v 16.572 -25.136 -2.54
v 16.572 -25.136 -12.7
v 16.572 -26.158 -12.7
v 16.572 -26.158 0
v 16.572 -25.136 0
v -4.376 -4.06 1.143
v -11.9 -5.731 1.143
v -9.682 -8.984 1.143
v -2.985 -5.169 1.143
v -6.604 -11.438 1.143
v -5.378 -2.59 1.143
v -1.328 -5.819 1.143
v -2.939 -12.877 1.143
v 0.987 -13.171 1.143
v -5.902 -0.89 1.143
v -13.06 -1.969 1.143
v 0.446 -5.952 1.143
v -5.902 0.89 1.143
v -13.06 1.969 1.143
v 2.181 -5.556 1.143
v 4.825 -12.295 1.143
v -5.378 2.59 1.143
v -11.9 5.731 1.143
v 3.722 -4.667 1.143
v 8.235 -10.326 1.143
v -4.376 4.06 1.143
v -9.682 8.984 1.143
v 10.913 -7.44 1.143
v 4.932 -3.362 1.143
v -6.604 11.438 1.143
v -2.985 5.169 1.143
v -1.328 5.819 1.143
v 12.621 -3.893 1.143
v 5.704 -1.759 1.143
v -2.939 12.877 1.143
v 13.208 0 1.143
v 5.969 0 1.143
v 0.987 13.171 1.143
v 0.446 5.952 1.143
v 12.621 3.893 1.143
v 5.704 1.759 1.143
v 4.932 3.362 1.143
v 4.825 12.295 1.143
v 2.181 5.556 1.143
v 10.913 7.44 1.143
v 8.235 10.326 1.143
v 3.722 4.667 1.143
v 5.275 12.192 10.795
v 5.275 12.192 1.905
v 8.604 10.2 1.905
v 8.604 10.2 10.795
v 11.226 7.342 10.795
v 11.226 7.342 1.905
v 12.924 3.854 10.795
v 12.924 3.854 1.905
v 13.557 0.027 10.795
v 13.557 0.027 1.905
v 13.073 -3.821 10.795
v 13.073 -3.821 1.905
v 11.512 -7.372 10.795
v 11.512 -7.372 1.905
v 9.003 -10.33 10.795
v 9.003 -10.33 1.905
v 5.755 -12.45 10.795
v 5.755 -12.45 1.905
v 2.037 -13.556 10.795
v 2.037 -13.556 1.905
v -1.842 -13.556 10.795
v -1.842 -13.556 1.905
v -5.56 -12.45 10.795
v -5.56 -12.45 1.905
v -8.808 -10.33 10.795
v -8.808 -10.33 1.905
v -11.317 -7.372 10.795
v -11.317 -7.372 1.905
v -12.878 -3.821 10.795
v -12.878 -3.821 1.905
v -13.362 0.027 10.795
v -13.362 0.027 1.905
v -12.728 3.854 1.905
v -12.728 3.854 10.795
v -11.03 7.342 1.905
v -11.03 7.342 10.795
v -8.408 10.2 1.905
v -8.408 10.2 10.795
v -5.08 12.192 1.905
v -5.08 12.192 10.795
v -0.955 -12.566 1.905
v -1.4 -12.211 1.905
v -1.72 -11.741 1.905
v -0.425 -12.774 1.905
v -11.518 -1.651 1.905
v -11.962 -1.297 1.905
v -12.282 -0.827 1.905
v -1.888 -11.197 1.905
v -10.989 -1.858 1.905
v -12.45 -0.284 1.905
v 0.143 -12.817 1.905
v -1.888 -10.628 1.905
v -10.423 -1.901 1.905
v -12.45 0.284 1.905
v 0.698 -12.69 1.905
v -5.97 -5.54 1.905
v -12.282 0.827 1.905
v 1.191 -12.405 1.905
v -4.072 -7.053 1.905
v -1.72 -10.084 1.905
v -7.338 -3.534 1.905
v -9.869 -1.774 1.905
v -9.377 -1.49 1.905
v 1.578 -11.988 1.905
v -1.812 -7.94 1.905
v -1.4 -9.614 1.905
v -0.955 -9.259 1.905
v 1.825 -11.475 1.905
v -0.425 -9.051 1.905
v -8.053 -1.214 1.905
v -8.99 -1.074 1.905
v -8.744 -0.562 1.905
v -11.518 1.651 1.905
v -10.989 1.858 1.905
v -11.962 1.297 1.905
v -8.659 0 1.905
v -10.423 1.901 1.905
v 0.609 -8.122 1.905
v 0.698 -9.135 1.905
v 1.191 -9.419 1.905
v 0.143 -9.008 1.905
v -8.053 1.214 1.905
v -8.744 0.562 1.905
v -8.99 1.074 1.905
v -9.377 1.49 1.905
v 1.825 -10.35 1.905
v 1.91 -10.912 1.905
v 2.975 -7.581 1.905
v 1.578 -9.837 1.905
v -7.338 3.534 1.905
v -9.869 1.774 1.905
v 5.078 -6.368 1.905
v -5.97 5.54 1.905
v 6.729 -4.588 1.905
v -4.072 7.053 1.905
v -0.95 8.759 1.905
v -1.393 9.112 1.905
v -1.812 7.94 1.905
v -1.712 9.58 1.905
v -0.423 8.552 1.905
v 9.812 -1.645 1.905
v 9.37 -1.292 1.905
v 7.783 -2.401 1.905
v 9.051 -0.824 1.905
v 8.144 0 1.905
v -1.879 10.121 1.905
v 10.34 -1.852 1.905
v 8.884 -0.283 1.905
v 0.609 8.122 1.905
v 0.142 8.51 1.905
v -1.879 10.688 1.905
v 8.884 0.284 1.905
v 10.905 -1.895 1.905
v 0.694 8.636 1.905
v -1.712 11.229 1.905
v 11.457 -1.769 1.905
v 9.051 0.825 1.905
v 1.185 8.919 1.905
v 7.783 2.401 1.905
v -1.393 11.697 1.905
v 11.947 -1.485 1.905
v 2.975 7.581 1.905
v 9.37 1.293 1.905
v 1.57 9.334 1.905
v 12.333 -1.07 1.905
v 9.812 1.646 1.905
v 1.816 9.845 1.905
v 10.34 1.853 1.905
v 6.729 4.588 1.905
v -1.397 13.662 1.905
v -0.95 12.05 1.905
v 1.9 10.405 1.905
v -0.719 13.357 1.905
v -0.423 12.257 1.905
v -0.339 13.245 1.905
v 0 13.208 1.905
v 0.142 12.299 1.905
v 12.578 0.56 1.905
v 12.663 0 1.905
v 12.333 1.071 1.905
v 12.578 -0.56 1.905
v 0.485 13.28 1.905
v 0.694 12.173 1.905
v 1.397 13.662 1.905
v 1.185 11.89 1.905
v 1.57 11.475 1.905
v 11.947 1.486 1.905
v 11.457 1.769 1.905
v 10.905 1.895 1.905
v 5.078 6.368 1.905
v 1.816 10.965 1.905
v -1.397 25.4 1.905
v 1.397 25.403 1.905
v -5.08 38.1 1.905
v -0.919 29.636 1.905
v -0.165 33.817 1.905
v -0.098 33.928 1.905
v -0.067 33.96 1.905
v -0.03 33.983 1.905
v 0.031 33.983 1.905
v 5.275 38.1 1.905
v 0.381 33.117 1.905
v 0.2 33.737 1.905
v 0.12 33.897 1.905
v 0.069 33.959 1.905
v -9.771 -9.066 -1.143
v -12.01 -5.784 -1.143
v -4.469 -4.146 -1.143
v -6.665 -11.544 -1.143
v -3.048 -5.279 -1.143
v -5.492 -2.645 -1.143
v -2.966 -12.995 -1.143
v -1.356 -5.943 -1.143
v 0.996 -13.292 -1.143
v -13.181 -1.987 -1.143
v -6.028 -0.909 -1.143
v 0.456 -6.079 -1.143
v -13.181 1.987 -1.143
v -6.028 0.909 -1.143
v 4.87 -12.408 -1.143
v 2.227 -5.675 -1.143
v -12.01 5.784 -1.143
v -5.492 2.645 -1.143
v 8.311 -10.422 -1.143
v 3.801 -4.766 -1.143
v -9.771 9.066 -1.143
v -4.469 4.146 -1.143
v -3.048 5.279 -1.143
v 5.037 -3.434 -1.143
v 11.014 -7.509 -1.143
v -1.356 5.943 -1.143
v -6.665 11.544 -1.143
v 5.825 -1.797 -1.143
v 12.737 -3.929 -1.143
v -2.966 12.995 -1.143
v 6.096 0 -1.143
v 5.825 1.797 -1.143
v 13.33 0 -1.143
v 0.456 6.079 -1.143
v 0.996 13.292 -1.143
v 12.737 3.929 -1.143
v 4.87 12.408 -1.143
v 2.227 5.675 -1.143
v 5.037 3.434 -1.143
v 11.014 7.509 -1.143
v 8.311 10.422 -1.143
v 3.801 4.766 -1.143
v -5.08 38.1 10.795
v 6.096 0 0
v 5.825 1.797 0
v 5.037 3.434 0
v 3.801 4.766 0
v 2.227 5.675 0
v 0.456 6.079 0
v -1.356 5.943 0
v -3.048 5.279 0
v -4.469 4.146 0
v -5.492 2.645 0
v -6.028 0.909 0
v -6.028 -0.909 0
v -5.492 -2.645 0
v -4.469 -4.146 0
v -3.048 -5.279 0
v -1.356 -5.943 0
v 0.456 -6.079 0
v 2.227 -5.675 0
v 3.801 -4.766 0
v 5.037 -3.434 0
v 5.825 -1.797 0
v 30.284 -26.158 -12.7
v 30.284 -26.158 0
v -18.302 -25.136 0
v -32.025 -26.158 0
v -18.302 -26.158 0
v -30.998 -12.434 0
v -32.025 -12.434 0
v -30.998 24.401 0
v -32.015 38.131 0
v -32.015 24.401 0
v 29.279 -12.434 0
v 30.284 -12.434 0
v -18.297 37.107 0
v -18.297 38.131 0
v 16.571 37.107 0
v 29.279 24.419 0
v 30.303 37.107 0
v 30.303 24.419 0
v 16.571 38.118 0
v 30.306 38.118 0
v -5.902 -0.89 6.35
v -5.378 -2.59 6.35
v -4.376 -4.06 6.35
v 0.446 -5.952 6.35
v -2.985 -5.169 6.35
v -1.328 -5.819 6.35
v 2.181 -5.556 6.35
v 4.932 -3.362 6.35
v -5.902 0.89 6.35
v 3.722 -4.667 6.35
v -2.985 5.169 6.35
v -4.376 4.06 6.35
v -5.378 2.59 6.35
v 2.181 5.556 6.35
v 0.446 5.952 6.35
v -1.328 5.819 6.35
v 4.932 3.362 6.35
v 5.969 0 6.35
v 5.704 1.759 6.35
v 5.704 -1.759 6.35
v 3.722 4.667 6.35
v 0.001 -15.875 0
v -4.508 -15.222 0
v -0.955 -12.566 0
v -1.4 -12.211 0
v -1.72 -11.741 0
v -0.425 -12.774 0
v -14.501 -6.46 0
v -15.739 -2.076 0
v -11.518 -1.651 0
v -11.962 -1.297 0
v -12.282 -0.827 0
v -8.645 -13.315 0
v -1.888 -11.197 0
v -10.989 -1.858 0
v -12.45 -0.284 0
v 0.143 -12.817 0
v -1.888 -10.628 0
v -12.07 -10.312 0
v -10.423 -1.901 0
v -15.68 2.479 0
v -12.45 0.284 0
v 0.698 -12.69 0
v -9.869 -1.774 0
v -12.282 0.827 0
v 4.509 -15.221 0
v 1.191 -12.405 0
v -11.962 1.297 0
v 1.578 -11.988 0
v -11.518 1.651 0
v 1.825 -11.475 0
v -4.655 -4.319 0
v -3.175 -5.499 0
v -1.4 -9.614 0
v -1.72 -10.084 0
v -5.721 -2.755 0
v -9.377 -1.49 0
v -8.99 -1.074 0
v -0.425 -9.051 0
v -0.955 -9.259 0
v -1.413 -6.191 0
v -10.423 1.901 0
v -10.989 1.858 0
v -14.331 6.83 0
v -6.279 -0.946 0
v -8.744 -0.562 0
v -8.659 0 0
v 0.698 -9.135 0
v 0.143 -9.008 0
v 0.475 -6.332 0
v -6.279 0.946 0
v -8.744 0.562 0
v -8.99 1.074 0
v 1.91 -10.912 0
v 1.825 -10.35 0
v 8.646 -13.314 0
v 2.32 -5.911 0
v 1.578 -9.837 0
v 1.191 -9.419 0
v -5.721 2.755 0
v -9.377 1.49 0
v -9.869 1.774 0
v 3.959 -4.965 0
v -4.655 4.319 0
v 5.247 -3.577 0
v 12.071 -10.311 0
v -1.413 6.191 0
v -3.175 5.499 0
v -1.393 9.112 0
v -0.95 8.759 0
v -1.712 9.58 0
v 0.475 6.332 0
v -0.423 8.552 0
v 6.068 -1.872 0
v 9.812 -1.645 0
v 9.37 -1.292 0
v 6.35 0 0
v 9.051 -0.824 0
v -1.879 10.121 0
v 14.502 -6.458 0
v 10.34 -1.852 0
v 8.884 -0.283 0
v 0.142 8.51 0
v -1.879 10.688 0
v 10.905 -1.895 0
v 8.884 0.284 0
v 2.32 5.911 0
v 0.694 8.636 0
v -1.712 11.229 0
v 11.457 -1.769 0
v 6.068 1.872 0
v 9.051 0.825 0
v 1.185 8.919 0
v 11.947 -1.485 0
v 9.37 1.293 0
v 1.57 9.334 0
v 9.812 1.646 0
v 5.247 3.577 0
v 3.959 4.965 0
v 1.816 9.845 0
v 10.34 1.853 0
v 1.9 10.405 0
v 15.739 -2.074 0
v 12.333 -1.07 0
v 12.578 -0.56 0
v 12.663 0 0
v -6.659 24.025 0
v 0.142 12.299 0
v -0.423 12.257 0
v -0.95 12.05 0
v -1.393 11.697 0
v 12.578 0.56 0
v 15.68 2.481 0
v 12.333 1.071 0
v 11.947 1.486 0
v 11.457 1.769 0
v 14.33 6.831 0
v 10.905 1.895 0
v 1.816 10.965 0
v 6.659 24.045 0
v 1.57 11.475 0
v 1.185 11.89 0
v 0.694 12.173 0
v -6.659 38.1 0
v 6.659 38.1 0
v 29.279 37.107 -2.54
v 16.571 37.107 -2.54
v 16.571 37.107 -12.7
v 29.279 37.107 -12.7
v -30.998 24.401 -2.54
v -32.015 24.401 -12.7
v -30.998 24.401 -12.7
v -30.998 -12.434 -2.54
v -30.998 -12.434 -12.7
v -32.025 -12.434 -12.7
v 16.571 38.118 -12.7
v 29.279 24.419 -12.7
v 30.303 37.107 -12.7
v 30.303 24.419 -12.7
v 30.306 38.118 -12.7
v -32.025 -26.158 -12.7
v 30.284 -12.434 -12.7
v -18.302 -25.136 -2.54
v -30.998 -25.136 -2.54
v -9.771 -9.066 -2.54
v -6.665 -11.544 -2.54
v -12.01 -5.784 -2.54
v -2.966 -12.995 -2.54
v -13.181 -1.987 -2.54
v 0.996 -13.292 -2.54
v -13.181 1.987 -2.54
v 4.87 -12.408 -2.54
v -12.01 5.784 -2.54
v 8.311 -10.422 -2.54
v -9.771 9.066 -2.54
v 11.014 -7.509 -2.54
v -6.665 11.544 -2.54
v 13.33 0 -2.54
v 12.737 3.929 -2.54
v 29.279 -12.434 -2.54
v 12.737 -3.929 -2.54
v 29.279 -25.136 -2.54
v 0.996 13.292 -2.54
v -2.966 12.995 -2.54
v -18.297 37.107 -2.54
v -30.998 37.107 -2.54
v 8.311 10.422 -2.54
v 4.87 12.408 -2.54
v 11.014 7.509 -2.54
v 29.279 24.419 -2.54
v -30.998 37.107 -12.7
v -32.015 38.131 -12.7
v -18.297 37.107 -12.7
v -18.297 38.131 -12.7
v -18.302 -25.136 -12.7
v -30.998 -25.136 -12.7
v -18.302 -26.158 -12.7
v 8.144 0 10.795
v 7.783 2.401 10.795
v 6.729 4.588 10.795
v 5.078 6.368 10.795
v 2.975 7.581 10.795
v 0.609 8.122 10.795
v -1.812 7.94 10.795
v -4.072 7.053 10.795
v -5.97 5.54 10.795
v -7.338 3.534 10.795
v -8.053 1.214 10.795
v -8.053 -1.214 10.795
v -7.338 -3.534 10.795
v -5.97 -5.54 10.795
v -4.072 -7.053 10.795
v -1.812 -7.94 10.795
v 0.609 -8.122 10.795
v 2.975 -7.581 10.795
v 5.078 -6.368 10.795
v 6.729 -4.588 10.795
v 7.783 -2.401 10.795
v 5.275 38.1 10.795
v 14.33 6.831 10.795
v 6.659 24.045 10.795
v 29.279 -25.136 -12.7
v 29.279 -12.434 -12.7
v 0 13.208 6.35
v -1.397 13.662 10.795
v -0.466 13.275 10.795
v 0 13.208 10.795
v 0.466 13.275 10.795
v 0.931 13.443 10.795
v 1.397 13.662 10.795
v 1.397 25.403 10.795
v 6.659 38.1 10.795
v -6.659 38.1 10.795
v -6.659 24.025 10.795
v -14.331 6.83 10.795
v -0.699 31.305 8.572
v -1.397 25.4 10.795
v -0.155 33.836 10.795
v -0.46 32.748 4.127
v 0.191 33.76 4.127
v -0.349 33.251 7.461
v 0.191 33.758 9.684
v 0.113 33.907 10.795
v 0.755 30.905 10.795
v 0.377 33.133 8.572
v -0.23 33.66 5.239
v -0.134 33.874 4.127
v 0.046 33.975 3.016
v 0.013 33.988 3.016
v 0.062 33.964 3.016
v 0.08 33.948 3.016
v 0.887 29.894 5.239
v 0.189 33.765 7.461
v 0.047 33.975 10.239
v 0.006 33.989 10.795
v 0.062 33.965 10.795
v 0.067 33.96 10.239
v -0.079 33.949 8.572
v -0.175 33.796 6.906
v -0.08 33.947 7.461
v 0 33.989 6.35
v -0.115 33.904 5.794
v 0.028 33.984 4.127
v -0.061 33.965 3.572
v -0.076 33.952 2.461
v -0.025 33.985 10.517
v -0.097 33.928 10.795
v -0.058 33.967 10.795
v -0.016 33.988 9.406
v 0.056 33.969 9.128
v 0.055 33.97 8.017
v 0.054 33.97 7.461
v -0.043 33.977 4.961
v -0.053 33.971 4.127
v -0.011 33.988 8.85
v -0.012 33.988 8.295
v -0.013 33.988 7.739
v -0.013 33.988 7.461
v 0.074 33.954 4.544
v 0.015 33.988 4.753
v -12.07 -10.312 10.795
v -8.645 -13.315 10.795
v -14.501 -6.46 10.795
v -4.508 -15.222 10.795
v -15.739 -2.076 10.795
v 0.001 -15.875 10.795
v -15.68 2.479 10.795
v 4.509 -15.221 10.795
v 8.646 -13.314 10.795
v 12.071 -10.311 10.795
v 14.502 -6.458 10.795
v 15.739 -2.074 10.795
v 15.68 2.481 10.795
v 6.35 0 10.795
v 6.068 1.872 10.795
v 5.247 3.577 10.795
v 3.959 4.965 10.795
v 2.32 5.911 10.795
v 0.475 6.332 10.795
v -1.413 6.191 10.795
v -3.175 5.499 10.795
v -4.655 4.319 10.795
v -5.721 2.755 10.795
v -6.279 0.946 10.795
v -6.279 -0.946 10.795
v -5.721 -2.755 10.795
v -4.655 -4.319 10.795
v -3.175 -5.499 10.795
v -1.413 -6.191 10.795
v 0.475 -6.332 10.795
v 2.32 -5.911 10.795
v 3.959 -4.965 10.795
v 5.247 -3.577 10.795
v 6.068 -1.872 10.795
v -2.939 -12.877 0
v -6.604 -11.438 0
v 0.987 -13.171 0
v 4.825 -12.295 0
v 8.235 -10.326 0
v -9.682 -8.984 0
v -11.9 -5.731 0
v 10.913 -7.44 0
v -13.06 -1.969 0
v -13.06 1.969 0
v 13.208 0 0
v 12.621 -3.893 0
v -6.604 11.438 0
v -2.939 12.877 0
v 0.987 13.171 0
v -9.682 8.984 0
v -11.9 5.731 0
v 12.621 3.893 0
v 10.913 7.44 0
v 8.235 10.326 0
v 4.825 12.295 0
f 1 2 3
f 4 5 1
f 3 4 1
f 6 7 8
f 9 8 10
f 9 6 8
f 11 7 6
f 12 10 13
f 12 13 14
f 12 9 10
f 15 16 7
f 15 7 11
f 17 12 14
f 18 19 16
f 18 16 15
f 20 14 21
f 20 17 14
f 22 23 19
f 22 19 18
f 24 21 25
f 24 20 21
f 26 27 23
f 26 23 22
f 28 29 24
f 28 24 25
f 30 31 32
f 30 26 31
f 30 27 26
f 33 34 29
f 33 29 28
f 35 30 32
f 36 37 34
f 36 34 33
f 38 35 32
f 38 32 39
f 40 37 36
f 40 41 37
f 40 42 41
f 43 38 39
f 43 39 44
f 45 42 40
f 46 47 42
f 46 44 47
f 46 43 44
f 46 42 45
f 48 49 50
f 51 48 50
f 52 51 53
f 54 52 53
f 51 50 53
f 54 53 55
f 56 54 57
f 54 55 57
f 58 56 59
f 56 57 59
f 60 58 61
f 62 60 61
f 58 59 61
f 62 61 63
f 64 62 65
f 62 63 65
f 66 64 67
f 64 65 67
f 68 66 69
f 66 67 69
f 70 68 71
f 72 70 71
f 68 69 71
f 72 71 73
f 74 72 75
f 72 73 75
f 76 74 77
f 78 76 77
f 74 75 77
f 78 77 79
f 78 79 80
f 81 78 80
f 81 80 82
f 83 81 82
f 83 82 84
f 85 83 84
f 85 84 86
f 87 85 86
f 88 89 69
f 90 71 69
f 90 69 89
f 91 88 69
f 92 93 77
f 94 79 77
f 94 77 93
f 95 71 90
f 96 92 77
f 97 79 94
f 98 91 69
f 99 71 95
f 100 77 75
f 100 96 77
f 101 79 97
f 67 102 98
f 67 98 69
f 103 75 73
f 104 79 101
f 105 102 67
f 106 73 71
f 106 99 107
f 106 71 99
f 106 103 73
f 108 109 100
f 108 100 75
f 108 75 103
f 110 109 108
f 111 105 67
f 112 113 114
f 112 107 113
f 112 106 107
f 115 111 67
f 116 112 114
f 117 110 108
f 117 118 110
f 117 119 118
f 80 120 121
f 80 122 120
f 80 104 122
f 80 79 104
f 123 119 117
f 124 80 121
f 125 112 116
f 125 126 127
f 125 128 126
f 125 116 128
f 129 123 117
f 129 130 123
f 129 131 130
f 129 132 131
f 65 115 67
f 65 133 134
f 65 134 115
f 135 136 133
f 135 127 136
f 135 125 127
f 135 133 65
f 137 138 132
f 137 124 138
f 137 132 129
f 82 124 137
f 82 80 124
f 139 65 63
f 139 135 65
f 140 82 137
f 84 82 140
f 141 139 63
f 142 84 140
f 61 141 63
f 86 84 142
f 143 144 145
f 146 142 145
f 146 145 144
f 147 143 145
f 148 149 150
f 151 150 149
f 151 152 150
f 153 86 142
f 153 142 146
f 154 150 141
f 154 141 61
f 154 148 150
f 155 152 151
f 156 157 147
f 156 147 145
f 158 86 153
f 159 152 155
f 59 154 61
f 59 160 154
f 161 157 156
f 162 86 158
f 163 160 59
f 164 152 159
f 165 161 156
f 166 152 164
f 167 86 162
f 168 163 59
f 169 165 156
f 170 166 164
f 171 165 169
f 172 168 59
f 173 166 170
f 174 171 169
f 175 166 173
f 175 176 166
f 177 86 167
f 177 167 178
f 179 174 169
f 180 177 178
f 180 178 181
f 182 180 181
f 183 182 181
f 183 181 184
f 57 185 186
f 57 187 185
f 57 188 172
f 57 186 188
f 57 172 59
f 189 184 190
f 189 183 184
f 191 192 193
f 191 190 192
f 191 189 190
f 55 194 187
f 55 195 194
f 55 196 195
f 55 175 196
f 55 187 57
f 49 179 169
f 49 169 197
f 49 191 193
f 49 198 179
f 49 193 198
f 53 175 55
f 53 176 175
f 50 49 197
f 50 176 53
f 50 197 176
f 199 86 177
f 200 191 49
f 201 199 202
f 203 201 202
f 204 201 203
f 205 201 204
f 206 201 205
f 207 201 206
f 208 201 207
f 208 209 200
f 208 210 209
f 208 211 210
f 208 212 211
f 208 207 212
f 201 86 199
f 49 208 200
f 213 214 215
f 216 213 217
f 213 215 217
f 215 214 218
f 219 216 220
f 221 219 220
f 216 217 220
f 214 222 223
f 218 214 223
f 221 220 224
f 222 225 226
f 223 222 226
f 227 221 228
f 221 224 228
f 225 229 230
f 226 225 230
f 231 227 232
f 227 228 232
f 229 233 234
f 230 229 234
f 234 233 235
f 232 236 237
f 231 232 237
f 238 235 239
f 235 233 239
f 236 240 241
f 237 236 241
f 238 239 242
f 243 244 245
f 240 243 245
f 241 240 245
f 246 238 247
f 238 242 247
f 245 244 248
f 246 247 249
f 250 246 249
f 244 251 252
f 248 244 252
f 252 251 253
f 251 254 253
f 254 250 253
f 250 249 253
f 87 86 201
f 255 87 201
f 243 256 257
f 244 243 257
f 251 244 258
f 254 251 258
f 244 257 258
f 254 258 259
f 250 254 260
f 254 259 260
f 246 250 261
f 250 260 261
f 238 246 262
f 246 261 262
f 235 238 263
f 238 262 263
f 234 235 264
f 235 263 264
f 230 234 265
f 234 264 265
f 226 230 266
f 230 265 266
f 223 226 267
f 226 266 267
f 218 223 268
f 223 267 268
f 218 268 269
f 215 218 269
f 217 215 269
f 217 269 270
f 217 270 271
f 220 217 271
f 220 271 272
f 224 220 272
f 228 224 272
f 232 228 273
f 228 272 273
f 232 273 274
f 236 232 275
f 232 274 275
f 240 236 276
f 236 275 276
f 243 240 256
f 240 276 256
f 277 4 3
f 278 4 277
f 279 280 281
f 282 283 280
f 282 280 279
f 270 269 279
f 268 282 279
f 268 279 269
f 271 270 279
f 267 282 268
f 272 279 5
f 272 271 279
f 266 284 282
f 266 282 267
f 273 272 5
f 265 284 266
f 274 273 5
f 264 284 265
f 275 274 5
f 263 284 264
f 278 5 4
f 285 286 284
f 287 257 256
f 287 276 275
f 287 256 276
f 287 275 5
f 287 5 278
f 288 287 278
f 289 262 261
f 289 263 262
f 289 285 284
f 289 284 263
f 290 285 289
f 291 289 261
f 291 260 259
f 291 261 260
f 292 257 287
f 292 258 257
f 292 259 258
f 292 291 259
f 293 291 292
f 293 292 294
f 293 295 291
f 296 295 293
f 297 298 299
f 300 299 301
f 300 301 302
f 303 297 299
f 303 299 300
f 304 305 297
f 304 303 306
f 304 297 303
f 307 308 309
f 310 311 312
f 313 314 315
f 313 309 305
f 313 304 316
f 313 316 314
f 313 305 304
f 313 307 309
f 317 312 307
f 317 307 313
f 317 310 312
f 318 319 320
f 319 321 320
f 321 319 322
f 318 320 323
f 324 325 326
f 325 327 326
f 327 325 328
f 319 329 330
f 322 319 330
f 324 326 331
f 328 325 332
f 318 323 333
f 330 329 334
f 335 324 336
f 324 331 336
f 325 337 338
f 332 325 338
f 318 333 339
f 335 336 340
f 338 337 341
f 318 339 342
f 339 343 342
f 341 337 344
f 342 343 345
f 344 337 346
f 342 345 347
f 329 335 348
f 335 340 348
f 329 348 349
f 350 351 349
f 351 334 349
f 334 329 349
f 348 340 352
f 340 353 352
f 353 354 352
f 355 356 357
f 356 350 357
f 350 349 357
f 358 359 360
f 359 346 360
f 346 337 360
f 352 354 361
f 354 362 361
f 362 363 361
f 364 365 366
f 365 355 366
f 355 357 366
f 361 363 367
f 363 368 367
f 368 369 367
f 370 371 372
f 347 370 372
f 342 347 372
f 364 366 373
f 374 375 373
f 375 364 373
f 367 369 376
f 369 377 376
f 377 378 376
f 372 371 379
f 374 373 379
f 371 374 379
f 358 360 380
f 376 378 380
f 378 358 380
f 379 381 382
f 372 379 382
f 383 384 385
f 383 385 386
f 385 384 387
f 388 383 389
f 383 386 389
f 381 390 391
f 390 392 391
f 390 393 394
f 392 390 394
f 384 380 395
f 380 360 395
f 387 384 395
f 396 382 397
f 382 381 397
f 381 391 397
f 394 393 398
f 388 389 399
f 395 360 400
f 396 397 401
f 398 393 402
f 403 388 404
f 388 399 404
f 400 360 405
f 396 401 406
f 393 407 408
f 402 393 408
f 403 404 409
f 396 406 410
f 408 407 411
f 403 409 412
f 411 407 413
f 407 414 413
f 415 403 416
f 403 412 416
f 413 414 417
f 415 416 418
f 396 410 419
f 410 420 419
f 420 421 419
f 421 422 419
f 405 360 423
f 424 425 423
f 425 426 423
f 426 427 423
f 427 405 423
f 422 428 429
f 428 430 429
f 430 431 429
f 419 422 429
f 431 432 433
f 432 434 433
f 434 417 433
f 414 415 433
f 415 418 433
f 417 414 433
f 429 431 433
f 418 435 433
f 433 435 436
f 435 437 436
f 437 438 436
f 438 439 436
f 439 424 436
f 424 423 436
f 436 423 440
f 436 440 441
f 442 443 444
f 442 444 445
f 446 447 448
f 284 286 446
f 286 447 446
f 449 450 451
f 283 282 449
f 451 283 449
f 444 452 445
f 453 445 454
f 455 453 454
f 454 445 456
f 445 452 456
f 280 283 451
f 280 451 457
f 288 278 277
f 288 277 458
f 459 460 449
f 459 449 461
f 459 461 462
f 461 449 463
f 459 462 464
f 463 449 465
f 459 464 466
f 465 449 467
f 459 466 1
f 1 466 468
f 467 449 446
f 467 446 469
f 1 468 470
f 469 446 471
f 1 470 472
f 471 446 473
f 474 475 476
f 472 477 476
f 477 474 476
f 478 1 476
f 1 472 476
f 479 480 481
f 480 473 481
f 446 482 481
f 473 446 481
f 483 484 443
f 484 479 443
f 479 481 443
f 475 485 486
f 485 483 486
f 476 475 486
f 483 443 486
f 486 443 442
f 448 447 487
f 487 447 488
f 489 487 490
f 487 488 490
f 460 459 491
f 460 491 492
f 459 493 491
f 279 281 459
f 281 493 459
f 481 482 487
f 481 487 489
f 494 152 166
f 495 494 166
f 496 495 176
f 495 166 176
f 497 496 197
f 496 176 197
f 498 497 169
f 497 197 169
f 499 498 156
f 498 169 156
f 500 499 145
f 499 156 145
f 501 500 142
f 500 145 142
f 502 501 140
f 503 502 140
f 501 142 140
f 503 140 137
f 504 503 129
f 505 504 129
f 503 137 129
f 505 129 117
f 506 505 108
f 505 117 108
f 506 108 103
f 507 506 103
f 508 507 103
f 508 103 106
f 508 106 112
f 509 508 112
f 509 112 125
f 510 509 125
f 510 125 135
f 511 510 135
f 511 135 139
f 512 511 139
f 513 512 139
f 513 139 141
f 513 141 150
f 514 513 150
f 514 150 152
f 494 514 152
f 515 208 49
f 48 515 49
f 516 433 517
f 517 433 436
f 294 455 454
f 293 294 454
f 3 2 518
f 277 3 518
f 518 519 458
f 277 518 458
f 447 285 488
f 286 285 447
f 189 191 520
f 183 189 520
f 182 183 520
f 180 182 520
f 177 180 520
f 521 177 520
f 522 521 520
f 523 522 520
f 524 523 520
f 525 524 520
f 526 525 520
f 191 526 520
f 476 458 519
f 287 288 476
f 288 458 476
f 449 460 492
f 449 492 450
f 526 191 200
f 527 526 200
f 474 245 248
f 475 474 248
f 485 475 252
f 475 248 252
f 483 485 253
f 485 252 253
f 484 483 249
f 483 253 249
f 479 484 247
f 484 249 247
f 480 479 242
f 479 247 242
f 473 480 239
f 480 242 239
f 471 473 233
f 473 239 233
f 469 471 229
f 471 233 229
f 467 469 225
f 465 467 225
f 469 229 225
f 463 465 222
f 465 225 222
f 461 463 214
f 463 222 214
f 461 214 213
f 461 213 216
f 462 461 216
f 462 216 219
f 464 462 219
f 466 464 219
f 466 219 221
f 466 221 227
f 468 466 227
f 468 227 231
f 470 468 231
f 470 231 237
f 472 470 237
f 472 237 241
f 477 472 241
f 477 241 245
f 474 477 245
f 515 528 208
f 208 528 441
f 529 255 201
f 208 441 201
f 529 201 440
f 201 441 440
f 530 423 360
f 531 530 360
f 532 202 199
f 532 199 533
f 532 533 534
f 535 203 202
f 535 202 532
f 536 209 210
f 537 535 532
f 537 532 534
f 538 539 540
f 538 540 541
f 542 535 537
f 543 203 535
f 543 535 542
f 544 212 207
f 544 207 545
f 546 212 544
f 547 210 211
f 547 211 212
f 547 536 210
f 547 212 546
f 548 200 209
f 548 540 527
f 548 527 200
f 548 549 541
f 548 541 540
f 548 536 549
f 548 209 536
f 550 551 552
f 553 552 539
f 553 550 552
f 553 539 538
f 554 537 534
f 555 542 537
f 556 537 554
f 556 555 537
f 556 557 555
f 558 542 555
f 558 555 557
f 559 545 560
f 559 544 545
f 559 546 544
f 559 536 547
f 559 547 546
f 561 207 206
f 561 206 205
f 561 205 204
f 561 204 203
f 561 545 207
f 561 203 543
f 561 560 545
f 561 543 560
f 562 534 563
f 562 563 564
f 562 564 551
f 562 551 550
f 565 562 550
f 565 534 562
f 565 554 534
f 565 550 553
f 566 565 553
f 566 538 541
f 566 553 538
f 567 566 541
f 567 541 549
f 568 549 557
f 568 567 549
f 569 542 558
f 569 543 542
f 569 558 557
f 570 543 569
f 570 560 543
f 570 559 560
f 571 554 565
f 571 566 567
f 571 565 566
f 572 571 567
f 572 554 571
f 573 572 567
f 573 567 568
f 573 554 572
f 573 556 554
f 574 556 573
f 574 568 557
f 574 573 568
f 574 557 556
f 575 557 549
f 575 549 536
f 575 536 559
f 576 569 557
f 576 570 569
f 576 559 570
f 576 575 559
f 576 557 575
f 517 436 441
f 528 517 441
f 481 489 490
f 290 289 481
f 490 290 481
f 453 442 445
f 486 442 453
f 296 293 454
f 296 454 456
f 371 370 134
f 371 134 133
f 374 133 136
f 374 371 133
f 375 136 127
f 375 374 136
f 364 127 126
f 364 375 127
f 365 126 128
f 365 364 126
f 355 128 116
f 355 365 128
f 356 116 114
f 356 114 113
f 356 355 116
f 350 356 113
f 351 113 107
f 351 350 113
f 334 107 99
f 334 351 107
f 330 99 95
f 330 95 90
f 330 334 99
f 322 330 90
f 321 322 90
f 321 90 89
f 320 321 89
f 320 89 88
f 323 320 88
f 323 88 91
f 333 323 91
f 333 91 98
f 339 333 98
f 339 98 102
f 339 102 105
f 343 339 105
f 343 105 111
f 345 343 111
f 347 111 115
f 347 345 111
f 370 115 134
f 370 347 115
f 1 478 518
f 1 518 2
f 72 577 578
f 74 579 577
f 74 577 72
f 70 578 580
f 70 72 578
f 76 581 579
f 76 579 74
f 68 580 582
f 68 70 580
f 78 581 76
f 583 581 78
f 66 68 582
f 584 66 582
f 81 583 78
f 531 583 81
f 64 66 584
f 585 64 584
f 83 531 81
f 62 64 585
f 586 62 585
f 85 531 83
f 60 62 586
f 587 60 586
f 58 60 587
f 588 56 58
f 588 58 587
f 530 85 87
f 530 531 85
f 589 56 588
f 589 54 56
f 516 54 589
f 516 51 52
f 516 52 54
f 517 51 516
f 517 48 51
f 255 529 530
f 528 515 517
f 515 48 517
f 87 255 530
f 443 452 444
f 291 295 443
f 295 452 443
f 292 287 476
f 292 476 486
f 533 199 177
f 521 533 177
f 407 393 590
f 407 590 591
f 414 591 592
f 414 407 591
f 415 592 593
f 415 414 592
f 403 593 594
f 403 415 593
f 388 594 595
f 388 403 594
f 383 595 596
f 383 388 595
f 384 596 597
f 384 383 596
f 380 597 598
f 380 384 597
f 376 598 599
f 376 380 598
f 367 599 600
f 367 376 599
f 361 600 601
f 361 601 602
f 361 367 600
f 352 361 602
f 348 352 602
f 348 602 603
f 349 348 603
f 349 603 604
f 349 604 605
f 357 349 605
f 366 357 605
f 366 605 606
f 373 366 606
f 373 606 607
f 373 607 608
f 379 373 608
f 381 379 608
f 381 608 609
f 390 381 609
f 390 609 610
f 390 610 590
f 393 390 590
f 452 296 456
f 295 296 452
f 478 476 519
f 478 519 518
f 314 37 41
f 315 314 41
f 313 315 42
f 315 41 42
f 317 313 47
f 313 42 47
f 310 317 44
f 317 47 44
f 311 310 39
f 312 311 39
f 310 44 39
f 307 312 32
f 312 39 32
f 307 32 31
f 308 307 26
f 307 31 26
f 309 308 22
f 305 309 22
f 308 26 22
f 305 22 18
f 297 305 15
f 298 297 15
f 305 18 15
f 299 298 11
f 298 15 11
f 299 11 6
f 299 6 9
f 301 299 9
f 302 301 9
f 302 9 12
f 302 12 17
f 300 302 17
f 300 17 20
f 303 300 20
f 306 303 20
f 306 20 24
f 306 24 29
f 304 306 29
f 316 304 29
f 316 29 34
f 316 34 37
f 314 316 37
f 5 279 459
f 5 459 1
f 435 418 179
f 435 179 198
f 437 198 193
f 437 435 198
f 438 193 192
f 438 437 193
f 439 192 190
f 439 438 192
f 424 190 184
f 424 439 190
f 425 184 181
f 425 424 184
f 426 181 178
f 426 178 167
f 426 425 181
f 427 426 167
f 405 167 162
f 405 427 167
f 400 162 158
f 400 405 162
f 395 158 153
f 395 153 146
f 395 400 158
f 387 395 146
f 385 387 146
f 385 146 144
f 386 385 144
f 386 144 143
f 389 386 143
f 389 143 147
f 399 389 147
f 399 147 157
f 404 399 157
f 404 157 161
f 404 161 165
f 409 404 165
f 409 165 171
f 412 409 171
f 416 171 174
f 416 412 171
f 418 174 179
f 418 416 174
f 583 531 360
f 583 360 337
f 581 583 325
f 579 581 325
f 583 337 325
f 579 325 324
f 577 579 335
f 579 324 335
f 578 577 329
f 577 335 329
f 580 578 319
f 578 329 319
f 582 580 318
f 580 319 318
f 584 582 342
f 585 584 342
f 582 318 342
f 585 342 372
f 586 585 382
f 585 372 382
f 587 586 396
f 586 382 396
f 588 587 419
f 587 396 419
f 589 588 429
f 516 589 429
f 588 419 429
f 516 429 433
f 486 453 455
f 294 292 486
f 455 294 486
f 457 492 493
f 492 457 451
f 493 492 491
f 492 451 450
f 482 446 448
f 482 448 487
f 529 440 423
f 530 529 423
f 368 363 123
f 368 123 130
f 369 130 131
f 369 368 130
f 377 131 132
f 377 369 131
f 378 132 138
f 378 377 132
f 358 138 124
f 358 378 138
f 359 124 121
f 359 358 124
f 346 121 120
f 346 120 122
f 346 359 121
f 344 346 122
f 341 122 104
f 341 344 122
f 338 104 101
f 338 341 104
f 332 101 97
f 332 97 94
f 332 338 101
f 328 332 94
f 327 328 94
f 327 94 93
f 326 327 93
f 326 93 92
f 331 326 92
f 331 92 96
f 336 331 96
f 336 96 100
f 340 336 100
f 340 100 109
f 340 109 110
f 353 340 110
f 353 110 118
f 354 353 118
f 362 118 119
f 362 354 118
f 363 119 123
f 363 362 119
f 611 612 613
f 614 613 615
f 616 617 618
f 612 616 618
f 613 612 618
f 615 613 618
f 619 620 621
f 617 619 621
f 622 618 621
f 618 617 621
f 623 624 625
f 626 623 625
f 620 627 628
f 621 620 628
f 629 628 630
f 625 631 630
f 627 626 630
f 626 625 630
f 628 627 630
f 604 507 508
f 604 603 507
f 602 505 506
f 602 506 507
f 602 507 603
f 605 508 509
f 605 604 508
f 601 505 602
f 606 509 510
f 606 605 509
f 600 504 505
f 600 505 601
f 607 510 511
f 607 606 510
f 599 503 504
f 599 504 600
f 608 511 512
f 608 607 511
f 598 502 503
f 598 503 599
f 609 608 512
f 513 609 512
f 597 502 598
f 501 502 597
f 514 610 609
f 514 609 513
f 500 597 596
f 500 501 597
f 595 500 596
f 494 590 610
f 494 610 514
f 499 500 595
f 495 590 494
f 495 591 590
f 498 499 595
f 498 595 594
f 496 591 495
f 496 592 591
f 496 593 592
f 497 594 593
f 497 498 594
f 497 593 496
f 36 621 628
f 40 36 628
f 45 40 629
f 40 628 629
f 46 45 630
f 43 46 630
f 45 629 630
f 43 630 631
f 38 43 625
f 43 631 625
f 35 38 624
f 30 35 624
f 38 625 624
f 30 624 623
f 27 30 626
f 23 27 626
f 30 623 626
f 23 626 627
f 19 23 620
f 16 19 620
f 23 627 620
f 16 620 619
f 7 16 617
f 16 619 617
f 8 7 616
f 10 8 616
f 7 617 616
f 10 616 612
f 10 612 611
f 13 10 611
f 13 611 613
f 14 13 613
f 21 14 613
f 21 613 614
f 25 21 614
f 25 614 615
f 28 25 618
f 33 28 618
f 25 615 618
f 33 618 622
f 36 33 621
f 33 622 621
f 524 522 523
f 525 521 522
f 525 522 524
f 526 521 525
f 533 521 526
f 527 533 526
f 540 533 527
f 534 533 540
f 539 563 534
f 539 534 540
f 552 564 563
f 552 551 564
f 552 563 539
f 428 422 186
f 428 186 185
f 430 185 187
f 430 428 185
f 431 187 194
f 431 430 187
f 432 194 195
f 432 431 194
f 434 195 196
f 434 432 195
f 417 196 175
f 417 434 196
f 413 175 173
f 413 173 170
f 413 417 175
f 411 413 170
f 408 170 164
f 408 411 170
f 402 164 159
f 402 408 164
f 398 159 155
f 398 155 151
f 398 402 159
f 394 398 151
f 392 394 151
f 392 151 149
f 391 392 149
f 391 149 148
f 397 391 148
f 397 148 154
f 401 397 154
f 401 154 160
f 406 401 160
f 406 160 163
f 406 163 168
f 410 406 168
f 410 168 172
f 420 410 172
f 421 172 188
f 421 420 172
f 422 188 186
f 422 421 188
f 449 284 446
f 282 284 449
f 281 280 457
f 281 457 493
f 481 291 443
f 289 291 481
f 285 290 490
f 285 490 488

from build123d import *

# Parameters (mm, degrees)
F0_R     = 1.9095863366
F0_R_2   = 1.9061403528
F0_R_3   = 8.144338214
F0_R_4   = 1.8999548266
F0_R_5   = 1.9002502649
F0_R_6   = 6.35
F1_DEPTH = 1.905
F2_DEPTH = 10.795
F3_R     = 5.969
F5_DEPTH = 6.35
F3_R_2   = 13.208
F6_DEPTH = 1.143
F4_R     = 13.329687055
F4_R_2   = 6.096
F7_DEPTH = 1.143
F8_DEPTH = 2.54
F9_DEPTH = 12.7


with BuildPart() as f1:
    # F0 (on Top) → F1 (new body)
    with BuildSketch(Plane.XY):
        with BuildLine():
            Line((-6.6588919425, 24.025004246), (-14.3305402873, 6.8301713064))
            ThreePointArc((-14.3305402873, 6.8301713064), (0.000639197, -15.8749999871), (14.3299902157, 6.8313253047))
            Line((14.3299902157, 6.8313253047), (6.6590019569, 24.045052064))
            Line((6.6590019569, 24.045052064), (6.6590019569, 38.1))
            Line((6.6590019569, 38.1), (5.2753846154, 38.1))
            Line((5.2753846154, 38.1), (5.2753846154, 12.192))
            ThreePointArc((5.2753846154, 12.192), (0.0976923077, -13.6964615385), (-5.08, 12.192))
            Line((-5.08, 12.192), (-5.08, 38.1))
            Line((-5.08, 38.1), (-6.6588919425, 38.1))
            Line((-6.6588919425, 38.1), (-6.6588919425, 24.025004246))
        make_face()
        with BuildLine():
            Line((5.2753846154, 38.1), (-5.08, 38.1))
            Line((-5.08, 38.1), (-5.08, 12.192))
            ThreePointArc((-5.08, 12.192), (0.0976923077, -13.6964615385), (5.2753846154, 12.192))
            Line((5.2753846154, 12.192), (5.2753846154, 38.1))
        make_face()
        with Locations((0, -10.9124137089)):
            Circle(F0_R, mode=Mode.SUBTRACT)
        with Locations((-10.5649987236, 0)):
            Circle(F0_R_2, mode=Mode.SUBTRACT)
        Circle(F0_R_3, mode=Mode.SUBTRACT)
        with Locations((0, 10.4045402259)):
            Circle(F0_R_4, mode=Mode.SUBTRACT)
        with Locations((10.7626086032, 0.0003860946)):
            Circle(F0_R_5, mode=Mode.SUBTRACT)
        with BuildLine():
            add(Edge.make_bspline(
                [(-1.397, 13.6617869139), (-0.9313333333, 13.4348934569), (0, 12.9811065431), (0.9313333333, 13.4348934569), (1.397, 13.6617869139)],
                knots=[0, 0, 0, 0, 0.5, 1, 1, 1, 1], degree=3))
            Line((-1.397, 13.6617869139), (-1.397, 17.2657109797))
            Line((-1.397, 17.2657109797), (-1.397, 25.3996907175))
            add(Edge.make_bspline(
                [(-1.397, 25.3996907175), (-0.9313529757, 29.6944177327), (-0.0001374736, 38.2831473186), (0.9313136976, 29.69591761), (1.397, 25.4026649147)],
                knots=[0, 0, 0, 0, 0.5000421741, 1, 1, 1, 1], degree=3))
            Line((1.397, 25.4026649147), (1.397, 17.2657109797))
            Line((1.397, 17.2657109797), (1.397, 13.6617869139))
        make_face(mode=Mode.SUBTRACT)
        with BuildLine():
            Line((-1.397, 17.2657109797), (-1.397, 13.6617869139))
            add(Edge.make_bspline(
                [(-1.397, 13.6617869139), (-0.9313333333, 13.4348934569), (0, 12.9811065431), (0.9313333333, 13.4348934569), (1.397, 13.6617869139)],
                knots=[0, 0, 0, 0, 0.5, 1, 1, 1, 1], degree=3))
            Line((1.397, 13.6617869139), (1.397, 17.2657109797))
            Line((1.397, 17.2657109797), (1.397, 25.4026649147))
            add(Edge.make_bspline(
                [(-1.397, 25.3996907175), (-0.9313529757, 29.6944177327), (-0.0001374736, 38.2831473186), (0.9313136976, 29.69591761), (1.397, 25.4026649147)],
                knots=[0, 0, 0, 0, 0.5000421741, 1, 1, 1, 1], degree=3))
            Line((-1.397, 25.3996907175), (-1.397, 17.2657109797))
        make_face()
        Circle(F0_R_3)
        Circle(F0_R_6, mode=Mode.SUBTRACT)
    extrude(amount=F1_DEPTH)

    # F0 (on Top) → F2 (join)
    with BuildSketch(Plane.XY):
        Circle(F0_R_3)
        Circle(F0_R_6, mode=Mode.SUBTRACT)
        with BuildLine():
            Line((-6.6588919425, 24.025004246), (-14.3305402873, 6.8301713064))
            ThreePointArc((-14.3305402873, 6.8301713064), (0.000639197, -15.8749999871), (14.3299902157, 6.8313253047))
            Line((14.3299902157, 6.8313253047), (6.6590019569, 24.045052064))
            Line((6.6590019569, 24.045052064), (6.6590019569, 38.1))
            Line((6.6590019569, 38.1), (5.2753846154, 38.1))
            Line((5.2753846154, 38.1), (5.2753846154, 12.192))
            ThreePointArc((5.2753846154, 12.192), (0.0976923077, -13.6964615385), (-5.08, 12.192))
            Line((-5.08, 12.192), (-5.08, 38.1))
            Line((-5.08, 38.1), (-6.6588919425, 38.1))
            Line((-6.6588919425, 38.1), (-6.6588919425, 24.025004246))
        make_face()
        with BuildLine():
            Line((-1.397, 17.2657109797), (-1.397, 13.6617869139))
            add(Edge.make_bspline(
                [(-1.397, 13.6617869139), (-0.9313333333, 13.4348934569), (0, 12.9811065431), (0.9313333333, 13.4348934569), (1.397, 13.6617869139)],
                knots=[0, 0, 0, 0, 0.5, 1, 1, 1, 1], degree=3))
            Line((1.397, 13.6617869139), (1.397, 17.2657109797))
            Line((1.397, 17.2657109797), (1.397, 25.4026649147))
            add(Edge.make_bspline(
                [(-1.397, 25.3996907175), (-0.9313529757, 29.6944177327), (-0.0001374736, 38.2831473186), (0.9313136976, 29.69591761), (1.397, 25.4026649147)],
                knots=[0, 0, 0, 0, 0.5000421741, 1, 1, 1, 1], degree=3))
            Line((-1.397, 25.3996907175), (-1.397, 17.2657109797))
        make_face()
    extrude(amount=F2_DEPTH)


with BuildPart() as f5:
    # F3 (on Top) → F5 (new body)
    with BuildSketch(Plane.XY):
        Circle(F3_R)
    extrude(amount=F5_DEPTH)

    # F3 (on Top) → F6 (join)
    with BuildSketch(Plane.XY):
        Circle(F3_R_2)
        Circle(F3_R, mode=Mode.SUBTRACT)
    extrude(amount=F6_DEPTH)


with BuildPart() as f7:
    # F4 (on Top) → F7 (new body)
    with BuildSketch(Plane.XY):
        Polygon((-30.9983175248, -12.4335922301), (-30.9983175248, -25.1362901181), (-18.3023493737, -25.1362901181), (0, -25.1362901181), (16.5724009275, -25.1362901181), (29.2792506516, -25.1362901181), (29.2792506516, -12.4335922301), (29.2792506516, 24.4187787175), (29.2792506516, 37.1073037386), (16.5714547038, 37.1073037386), (-18.2970520109, 37.1073037386), (-30.9983175248, 37.1073037386), (-30.9983175248, 24.4006793946), (-30.9983175248, 0), align=None)
        Circle(F4_R, mode=Mode.SUBTRACT)
        Circle(F4_R)
        Circle(F4_R_2, mode=Mode.SUBTRACT)
        Polygon((29.2792506516, -25.1362901181), (16.5724009275, -25.1362901181), (16.5724009275, -26.1582173407), (29.2792506516, -26.1582173407), (30.2841644734, -26.1582173407), (30.2841644734, -25.1362901181), (30.2841644734, -12.4335922301), (29.2792506516, -12.4335922301), align=None)
    extrude(amount=-F7_DEPTH)

    # F4 (on Top) → F8 (join)
    with BuildSketch(Plane.XY):
        Polygon((-30.9983175248, -12.4335922301), (-30.9983175248, -25.1362901181), (-18.3023493737, -25.1362901181), (0, -25.1362901181), (16.5724009275, -25.1362901181), (29.2792506516, -25.1362901181), (29.2792506516, -12.4335922301), (29.2792506516, 24.4187787175), (29.2792506516, 37.1073037386), (16.5714547038, 37.1073037386), (-18.2970520109, 37.1073037386), (-30.9983175248, 37.1073037386), (-30.9983175248, 24.4006793946), (-30.9983175248, 0), align=None)
        Circle(F4_R, mode=Mode.SUBTRACT)
        Polygon((-18.3023493737, -25.1362901181), (-30.9983175248, -25.1362901181), (-30.9983175248, -12.4335922301), (-32.0252366364, -12.4335922301), (-32.0252366364, -25.1362901181), (-32.0252366364, -26.1582173407), (-30.9983175248, -26.1582173407), (-18.3023493737, -26.1582173407), align=None)
        Polygon((29.2792506516, -25.1362901181), (16.5724009275, -25.1362901181), (16.5724009275, -26.1582173407), (29.2792506516, -26.1582173407), (30.2841644734, -26.1582173407), (30.2841644734, -25.1362901181), (30.2841644734, -12.4335922301), (29.2792506516, -12.4335922301), align=None)
        Polygon((-32.0145189762, 24.4006793946), (-30.9983175248, 24.4006793946), (-30.9983175248, 37.1073037386), (-18.2970520109, 37.1073037386), (-18.2970520109, 38.1312929094), (-30.9983175248, 38.1312929094), (-32.0145189762, 38.1312929094), (-32.0145189762, 37.1073037386), align=None)
        Polygon((29.2792506516, 37.1073037386), (29.2792506516, 24.4187787175), (30.3034484386, 24.4187787175), (30.3034484386, 37.1073037386), (30.3062088788, 38.1182320416), (29.2792506516, 38.1182320416), (16.5714547038, 38.1182320416), (16.5714547038, 37.1073037386), align=None)
    extrude(amount=-F8_DEPTH)

    # F4 (on Top) → F9 (join)
    with BuildSketch(Plane.XY):
        Polygon((-32.0145189762, 24.4006793946), (-30.9983175248, 24.4006793946), (-30.9983175248, 37.1073037386), (-18.2970520109, 37.1073037386), (-18.2970520109, 38.1312929094), (-30.9983175248, 38.1312929094), (-32.0145189762, 38.1312929094), (-32.0145189762, 37.1073037386), align=None)
        Polygon((-18.3023493737, -25.1362901181), (-30.9983175248, -25.1362901181), (-30.9983175248, -12.4335922301), (-32.0252366364, -12.4335922301), (-32.0252366364, -25.1362901181), (-32.0252366364, -26.1582173407), (-30.9983175248, -26.1582173407), (-18.3023493737, -26.1582173407), align=None)
        Polygon((29.2792506516, -25.1362901181), (16.5724009275, -25.1362901181), (16.5724009275, -26.1582173407), (29.2792506516, -26.1582173407), (30.2841644734, -26.1582173407), (30.2841644734, -25.1362901181), (30.2841644734, -12.4335922301), (29.2792506516, -12.4335922301), align=None)
        Polygon((29.2792506516, 37.1073037386), (29.2792506516, 24.4187787175), (30.3034484386, 24.4187787175), (30.3034484386, 37.1073037386), (30.3062088788, 38.1182320416), (29.2792506516, 38.1182320416), (16.5714547038, 38.1182320416), (16.5714547038, 37.1073037386), align=None)
    extrude(amount=-F9_DEPTH)


solid = Compound([f1.part, f5.part, f7.part])
